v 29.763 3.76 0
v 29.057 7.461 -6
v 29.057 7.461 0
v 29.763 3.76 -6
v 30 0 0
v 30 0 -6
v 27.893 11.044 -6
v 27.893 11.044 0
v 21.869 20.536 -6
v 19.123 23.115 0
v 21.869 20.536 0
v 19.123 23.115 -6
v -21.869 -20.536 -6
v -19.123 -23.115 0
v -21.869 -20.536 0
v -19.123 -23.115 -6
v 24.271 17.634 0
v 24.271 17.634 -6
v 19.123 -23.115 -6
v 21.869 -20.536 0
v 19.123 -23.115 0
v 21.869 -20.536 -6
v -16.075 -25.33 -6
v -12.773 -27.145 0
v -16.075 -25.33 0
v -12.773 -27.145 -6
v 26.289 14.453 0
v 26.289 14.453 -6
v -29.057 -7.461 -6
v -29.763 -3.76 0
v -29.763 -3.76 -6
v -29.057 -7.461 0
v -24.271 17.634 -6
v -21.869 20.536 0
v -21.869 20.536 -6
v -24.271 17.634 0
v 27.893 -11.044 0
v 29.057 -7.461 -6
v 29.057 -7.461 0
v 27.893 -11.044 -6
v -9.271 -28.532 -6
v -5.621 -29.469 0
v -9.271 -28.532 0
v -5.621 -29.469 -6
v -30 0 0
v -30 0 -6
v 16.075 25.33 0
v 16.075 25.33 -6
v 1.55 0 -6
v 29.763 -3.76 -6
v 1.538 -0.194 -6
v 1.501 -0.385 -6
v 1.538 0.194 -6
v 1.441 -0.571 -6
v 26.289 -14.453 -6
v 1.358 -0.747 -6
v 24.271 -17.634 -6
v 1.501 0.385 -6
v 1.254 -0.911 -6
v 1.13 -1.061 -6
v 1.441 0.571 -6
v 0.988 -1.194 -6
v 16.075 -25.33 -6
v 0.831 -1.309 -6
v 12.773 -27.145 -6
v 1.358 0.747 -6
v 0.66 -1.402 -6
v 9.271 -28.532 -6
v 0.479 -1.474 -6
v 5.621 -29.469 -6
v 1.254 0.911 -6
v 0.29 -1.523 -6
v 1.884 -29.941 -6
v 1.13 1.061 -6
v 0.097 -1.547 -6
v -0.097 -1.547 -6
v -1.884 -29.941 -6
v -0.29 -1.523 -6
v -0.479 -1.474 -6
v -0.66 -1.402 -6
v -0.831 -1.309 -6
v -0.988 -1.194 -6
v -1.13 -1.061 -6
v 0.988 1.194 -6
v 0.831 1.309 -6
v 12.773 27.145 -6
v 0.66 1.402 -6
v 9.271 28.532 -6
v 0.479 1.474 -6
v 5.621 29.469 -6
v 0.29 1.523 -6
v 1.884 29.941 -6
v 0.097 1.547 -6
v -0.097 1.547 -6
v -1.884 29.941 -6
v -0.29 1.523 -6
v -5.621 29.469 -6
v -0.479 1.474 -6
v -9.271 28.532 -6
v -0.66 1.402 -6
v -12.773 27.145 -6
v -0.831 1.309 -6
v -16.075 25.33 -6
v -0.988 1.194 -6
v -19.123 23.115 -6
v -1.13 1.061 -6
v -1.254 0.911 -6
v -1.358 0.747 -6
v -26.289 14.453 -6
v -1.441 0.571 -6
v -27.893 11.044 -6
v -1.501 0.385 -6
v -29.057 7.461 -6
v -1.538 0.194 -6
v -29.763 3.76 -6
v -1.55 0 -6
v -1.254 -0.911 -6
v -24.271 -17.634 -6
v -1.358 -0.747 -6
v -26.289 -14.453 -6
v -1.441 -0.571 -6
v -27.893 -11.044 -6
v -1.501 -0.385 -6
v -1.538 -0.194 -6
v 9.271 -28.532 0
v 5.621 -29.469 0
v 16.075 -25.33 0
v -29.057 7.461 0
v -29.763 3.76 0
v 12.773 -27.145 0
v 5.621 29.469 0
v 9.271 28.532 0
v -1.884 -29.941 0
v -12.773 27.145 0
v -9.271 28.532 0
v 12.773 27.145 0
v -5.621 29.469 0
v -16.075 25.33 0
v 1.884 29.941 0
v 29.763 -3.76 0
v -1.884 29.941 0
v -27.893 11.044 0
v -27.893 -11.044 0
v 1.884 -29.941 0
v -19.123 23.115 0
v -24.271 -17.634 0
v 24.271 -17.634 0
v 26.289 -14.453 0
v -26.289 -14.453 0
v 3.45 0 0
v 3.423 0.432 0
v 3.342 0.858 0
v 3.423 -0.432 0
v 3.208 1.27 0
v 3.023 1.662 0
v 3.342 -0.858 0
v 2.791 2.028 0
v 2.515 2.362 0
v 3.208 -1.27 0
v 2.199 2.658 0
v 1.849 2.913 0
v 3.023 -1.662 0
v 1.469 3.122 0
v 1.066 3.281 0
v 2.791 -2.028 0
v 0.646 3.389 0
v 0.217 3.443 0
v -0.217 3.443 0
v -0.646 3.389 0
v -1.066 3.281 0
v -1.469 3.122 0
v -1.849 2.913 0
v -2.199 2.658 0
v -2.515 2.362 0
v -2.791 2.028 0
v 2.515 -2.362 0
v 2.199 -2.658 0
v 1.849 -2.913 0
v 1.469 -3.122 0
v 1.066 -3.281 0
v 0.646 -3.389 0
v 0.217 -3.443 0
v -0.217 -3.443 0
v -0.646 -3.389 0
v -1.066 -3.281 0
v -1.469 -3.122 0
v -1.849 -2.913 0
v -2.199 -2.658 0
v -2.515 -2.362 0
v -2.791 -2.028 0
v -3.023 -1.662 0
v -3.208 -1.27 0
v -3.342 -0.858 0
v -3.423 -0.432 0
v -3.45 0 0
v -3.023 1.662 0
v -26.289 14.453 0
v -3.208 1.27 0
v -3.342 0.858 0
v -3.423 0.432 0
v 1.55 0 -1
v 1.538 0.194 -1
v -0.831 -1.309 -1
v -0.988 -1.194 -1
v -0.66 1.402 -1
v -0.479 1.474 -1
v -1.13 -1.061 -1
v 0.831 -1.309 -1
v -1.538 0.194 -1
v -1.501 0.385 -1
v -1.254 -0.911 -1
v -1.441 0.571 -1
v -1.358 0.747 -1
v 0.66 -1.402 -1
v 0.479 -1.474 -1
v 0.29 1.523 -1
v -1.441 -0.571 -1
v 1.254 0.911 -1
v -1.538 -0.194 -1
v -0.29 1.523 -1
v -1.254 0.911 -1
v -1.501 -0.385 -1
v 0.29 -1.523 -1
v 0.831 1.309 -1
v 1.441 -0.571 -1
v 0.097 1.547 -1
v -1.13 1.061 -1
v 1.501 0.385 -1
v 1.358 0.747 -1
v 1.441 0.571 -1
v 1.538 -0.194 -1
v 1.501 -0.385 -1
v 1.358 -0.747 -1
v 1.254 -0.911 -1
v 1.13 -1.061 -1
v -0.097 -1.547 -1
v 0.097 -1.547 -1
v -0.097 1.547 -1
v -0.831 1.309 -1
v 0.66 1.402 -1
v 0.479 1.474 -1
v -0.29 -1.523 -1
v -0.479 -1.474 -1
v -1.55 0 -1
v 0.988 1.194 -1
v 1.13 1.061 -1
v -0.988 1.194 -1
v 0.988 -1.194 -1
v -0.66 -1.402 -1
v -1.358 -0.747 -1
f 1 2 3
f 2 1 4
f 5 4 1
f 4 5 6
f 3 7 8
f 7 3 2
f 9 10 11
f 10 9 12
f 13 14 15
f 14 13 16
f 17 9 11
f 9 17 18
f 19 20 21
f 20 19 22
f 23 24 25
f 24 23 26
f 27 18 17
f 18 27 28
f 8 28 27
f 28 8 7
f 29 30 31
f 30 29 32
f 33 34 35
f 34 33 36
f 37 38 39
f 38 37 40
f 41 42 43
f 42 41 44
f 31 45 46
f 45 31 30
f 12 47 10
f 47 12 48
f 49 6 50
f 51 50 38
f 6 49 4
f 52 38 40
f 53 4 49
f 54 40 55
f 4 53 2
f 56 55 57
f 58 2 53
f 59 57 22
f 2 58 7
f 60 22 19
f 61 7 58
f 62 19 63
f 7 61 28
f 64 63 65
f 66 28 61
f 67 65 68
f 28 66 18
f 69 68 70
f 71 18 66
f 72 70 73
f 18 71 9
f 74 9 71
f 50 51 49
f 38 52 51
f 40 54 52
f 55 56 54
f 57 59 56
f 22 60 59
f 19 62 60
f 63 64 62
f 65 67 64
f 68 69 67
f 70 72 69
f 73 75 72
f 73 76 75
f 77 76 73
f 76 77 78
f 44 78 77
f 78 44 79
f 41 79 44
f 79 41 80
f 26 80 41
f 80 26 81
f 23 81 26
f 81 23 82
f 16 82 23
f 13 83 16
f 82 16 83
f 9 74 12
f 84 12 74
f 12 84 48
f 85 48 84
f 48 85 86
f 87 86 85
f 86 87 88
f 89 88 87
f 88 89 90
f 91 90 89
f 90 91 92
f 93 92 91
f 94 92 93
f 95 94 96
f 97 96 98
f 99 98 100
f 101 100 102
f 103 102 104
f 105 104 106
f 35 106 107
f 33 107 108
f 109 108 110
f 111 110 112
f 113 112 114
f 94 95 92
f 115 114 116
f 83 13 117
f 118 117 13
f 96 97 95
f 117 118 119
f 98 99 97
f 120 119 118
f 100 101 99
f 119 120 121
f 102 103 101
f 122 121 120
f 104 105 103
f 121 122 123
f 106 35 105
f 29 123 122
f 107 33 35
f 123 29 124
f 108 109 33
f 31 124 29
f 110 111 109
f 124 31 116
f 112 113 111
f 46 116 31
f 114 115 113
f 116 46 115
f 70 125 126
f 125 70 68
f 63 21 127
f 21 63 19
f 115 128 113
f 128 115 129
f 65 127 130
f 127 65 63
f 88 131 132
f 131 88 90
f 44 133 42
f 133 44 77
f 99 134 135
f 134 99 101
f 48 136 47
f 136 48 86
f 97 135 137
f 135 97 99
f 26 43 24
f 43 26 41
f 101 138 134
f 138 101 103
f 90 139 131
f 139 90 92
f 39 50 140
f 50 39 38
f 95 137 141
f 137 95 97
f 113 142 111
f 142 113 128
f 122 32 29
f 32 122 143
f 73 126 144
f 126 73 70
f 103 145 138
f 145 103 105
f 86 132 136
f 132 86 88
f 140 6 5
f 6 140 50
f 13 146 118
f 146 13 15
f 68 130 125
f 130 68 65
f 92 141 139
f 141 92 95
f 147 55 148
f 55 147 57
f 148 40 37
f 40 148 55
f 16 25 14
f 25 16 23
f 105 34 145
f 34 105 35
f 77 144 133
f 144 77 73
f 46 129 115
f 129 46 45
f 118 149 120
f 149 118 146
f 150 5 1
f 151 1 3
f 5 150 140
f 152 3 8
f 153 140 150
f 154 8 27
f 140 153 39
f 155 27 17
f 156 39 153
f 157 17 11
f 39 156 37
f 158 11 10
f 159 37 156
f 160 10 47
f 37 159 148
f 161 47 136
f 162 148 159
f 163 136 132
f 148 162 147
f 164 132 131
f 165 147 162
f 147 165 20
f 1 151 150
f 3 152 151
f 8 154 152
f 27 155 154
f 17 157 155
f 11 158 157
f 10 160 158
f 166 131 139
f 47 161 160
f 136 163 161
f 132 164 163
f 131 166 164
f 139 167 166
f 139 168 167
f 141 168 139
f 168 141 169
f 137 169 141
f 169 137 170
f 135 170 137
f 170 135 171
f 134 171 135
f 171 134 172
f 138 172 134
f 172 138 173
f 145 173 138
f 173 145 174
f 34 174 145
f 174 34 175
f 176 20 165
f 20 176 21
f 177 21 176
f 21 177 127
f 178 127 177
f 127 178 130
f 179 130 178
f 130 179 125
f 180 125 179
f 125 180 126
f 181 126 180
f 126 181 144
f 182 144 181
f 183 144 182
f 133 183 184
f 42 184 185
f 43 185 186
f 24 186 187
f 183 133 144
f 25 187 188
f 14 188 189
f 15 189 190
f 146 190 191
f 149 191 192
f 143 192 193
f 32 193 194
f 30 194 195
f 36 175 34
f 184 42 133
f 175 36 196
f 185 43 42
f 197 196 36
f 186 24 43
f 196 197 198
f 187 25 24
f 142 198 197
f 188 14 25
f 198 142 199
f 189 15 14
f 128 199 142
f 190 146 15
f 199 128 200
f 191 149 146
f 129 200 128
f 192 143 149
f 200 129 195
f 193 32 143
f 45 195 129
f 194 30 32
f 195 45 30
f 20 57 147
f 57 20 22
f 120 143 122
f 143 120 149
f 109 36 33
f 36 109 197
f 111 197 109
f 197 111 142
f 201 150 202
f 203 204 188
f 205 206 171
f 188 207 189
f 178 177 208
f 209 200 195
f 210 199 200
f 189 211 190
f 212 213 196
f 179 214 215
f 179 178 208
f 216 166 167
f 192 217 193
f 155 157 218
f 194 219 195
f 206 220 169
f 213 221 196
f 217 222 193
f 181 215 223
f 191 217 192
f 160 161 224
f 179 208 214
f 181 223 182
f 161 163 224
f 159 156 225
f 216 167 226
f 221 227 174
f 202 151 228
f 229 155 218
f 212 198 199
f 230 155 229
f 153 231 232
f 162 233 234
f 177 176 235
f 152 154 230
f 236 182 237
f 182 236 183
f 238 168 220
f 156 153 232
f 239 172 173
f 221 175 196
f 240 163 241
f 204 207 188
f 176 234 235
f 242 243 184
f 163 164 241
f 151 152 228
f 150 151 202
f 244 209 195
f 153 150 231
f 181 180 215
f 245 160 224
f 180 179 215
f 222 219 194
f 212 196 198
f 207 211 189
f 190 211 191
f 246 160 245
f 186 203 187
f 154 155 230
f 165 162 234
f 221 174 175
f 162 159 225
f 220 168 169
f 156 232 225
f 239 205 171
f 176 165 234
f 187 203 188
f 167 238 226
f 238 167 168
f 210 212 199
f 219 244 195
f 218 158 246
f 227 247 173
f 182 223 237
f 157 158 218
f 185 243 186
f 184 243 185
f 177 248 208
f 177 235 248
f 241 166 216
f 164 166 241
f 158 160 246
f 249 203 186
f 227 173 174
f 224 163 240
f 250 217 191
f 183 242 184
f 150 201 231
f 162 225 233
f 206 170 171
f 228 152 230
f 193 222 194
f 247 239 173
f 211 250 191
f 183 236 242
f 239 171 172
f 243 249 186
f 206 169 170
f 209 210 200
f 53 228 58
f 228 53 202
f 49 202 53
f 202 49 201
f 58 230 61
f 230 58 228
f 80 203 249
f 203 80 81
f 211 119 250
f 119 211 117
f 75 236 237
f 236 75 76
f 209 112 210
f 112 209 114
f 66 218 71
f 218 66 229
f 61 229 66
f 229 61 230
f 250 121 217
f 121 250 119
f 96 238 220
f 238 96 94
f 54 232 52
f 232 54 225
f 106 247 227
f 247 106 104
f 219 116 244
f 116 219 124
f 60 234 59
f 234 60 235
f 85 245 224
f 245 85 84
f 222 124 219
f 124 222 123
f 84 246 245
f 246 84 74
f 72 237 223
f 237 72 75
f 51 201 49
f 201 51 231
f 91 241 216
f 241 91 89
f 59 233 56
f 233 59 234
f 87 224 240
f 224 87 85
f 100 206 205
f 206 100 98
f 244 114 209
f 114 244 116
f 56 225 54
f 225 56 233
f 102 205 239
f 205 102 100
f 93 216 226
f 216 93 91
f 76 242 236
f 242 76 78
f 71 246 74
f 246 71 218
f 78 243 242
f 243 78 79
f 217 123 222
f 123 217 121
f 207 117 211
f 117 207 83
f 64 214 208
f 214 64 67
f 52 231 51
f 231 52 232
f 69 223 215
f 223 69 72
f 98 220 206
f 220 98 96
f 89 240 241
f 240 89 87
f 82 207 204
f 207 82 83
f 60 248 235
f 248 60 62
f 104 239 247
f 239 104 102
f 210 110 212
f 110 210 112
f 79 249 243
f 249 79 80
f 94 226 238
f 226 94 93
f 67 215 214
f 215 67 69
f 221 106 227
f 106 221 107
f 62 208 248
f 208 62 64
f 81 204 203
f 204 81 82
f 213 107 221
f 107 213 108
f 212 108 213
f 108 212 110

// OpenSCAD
$fn = 50;


difference() {
	union() {
		translate(v = [0, 0, -6.0000000000]) {
			cylinder(h = 6, r = 30.0000000000);
		}
		translate(v = [0, 0, -6.0000000000]) {
			cylinder(h = 6, r = 2.8750000000);
		}
	}
	union() {
		translate(v = [0, 0, 0]) {
			rotate(a = [0, 0, 0]) {
				difference() {
					union() {
						translate(v = [0, 0, -6.0000000000]) {
							cylinder(h = 6, r = 1.2500000000);
						}
						translate(v = [0, 0, -1.0000000000]) {
							cylinder(h = 1.0000000000, r1 = 1.5500000000, r2 = 3.4500000000);
						}
						translate(v = [0, 0, -6.0000000000]) {
							cylinder(h = 6, r = 1.5500000000);
						}
						translate(v = [0, 0, -6.0000000000]) {
							cylinder(h = 6, r = 1.2500000000);
						}
					}
					union();
				}
			}
		}
	}
}
